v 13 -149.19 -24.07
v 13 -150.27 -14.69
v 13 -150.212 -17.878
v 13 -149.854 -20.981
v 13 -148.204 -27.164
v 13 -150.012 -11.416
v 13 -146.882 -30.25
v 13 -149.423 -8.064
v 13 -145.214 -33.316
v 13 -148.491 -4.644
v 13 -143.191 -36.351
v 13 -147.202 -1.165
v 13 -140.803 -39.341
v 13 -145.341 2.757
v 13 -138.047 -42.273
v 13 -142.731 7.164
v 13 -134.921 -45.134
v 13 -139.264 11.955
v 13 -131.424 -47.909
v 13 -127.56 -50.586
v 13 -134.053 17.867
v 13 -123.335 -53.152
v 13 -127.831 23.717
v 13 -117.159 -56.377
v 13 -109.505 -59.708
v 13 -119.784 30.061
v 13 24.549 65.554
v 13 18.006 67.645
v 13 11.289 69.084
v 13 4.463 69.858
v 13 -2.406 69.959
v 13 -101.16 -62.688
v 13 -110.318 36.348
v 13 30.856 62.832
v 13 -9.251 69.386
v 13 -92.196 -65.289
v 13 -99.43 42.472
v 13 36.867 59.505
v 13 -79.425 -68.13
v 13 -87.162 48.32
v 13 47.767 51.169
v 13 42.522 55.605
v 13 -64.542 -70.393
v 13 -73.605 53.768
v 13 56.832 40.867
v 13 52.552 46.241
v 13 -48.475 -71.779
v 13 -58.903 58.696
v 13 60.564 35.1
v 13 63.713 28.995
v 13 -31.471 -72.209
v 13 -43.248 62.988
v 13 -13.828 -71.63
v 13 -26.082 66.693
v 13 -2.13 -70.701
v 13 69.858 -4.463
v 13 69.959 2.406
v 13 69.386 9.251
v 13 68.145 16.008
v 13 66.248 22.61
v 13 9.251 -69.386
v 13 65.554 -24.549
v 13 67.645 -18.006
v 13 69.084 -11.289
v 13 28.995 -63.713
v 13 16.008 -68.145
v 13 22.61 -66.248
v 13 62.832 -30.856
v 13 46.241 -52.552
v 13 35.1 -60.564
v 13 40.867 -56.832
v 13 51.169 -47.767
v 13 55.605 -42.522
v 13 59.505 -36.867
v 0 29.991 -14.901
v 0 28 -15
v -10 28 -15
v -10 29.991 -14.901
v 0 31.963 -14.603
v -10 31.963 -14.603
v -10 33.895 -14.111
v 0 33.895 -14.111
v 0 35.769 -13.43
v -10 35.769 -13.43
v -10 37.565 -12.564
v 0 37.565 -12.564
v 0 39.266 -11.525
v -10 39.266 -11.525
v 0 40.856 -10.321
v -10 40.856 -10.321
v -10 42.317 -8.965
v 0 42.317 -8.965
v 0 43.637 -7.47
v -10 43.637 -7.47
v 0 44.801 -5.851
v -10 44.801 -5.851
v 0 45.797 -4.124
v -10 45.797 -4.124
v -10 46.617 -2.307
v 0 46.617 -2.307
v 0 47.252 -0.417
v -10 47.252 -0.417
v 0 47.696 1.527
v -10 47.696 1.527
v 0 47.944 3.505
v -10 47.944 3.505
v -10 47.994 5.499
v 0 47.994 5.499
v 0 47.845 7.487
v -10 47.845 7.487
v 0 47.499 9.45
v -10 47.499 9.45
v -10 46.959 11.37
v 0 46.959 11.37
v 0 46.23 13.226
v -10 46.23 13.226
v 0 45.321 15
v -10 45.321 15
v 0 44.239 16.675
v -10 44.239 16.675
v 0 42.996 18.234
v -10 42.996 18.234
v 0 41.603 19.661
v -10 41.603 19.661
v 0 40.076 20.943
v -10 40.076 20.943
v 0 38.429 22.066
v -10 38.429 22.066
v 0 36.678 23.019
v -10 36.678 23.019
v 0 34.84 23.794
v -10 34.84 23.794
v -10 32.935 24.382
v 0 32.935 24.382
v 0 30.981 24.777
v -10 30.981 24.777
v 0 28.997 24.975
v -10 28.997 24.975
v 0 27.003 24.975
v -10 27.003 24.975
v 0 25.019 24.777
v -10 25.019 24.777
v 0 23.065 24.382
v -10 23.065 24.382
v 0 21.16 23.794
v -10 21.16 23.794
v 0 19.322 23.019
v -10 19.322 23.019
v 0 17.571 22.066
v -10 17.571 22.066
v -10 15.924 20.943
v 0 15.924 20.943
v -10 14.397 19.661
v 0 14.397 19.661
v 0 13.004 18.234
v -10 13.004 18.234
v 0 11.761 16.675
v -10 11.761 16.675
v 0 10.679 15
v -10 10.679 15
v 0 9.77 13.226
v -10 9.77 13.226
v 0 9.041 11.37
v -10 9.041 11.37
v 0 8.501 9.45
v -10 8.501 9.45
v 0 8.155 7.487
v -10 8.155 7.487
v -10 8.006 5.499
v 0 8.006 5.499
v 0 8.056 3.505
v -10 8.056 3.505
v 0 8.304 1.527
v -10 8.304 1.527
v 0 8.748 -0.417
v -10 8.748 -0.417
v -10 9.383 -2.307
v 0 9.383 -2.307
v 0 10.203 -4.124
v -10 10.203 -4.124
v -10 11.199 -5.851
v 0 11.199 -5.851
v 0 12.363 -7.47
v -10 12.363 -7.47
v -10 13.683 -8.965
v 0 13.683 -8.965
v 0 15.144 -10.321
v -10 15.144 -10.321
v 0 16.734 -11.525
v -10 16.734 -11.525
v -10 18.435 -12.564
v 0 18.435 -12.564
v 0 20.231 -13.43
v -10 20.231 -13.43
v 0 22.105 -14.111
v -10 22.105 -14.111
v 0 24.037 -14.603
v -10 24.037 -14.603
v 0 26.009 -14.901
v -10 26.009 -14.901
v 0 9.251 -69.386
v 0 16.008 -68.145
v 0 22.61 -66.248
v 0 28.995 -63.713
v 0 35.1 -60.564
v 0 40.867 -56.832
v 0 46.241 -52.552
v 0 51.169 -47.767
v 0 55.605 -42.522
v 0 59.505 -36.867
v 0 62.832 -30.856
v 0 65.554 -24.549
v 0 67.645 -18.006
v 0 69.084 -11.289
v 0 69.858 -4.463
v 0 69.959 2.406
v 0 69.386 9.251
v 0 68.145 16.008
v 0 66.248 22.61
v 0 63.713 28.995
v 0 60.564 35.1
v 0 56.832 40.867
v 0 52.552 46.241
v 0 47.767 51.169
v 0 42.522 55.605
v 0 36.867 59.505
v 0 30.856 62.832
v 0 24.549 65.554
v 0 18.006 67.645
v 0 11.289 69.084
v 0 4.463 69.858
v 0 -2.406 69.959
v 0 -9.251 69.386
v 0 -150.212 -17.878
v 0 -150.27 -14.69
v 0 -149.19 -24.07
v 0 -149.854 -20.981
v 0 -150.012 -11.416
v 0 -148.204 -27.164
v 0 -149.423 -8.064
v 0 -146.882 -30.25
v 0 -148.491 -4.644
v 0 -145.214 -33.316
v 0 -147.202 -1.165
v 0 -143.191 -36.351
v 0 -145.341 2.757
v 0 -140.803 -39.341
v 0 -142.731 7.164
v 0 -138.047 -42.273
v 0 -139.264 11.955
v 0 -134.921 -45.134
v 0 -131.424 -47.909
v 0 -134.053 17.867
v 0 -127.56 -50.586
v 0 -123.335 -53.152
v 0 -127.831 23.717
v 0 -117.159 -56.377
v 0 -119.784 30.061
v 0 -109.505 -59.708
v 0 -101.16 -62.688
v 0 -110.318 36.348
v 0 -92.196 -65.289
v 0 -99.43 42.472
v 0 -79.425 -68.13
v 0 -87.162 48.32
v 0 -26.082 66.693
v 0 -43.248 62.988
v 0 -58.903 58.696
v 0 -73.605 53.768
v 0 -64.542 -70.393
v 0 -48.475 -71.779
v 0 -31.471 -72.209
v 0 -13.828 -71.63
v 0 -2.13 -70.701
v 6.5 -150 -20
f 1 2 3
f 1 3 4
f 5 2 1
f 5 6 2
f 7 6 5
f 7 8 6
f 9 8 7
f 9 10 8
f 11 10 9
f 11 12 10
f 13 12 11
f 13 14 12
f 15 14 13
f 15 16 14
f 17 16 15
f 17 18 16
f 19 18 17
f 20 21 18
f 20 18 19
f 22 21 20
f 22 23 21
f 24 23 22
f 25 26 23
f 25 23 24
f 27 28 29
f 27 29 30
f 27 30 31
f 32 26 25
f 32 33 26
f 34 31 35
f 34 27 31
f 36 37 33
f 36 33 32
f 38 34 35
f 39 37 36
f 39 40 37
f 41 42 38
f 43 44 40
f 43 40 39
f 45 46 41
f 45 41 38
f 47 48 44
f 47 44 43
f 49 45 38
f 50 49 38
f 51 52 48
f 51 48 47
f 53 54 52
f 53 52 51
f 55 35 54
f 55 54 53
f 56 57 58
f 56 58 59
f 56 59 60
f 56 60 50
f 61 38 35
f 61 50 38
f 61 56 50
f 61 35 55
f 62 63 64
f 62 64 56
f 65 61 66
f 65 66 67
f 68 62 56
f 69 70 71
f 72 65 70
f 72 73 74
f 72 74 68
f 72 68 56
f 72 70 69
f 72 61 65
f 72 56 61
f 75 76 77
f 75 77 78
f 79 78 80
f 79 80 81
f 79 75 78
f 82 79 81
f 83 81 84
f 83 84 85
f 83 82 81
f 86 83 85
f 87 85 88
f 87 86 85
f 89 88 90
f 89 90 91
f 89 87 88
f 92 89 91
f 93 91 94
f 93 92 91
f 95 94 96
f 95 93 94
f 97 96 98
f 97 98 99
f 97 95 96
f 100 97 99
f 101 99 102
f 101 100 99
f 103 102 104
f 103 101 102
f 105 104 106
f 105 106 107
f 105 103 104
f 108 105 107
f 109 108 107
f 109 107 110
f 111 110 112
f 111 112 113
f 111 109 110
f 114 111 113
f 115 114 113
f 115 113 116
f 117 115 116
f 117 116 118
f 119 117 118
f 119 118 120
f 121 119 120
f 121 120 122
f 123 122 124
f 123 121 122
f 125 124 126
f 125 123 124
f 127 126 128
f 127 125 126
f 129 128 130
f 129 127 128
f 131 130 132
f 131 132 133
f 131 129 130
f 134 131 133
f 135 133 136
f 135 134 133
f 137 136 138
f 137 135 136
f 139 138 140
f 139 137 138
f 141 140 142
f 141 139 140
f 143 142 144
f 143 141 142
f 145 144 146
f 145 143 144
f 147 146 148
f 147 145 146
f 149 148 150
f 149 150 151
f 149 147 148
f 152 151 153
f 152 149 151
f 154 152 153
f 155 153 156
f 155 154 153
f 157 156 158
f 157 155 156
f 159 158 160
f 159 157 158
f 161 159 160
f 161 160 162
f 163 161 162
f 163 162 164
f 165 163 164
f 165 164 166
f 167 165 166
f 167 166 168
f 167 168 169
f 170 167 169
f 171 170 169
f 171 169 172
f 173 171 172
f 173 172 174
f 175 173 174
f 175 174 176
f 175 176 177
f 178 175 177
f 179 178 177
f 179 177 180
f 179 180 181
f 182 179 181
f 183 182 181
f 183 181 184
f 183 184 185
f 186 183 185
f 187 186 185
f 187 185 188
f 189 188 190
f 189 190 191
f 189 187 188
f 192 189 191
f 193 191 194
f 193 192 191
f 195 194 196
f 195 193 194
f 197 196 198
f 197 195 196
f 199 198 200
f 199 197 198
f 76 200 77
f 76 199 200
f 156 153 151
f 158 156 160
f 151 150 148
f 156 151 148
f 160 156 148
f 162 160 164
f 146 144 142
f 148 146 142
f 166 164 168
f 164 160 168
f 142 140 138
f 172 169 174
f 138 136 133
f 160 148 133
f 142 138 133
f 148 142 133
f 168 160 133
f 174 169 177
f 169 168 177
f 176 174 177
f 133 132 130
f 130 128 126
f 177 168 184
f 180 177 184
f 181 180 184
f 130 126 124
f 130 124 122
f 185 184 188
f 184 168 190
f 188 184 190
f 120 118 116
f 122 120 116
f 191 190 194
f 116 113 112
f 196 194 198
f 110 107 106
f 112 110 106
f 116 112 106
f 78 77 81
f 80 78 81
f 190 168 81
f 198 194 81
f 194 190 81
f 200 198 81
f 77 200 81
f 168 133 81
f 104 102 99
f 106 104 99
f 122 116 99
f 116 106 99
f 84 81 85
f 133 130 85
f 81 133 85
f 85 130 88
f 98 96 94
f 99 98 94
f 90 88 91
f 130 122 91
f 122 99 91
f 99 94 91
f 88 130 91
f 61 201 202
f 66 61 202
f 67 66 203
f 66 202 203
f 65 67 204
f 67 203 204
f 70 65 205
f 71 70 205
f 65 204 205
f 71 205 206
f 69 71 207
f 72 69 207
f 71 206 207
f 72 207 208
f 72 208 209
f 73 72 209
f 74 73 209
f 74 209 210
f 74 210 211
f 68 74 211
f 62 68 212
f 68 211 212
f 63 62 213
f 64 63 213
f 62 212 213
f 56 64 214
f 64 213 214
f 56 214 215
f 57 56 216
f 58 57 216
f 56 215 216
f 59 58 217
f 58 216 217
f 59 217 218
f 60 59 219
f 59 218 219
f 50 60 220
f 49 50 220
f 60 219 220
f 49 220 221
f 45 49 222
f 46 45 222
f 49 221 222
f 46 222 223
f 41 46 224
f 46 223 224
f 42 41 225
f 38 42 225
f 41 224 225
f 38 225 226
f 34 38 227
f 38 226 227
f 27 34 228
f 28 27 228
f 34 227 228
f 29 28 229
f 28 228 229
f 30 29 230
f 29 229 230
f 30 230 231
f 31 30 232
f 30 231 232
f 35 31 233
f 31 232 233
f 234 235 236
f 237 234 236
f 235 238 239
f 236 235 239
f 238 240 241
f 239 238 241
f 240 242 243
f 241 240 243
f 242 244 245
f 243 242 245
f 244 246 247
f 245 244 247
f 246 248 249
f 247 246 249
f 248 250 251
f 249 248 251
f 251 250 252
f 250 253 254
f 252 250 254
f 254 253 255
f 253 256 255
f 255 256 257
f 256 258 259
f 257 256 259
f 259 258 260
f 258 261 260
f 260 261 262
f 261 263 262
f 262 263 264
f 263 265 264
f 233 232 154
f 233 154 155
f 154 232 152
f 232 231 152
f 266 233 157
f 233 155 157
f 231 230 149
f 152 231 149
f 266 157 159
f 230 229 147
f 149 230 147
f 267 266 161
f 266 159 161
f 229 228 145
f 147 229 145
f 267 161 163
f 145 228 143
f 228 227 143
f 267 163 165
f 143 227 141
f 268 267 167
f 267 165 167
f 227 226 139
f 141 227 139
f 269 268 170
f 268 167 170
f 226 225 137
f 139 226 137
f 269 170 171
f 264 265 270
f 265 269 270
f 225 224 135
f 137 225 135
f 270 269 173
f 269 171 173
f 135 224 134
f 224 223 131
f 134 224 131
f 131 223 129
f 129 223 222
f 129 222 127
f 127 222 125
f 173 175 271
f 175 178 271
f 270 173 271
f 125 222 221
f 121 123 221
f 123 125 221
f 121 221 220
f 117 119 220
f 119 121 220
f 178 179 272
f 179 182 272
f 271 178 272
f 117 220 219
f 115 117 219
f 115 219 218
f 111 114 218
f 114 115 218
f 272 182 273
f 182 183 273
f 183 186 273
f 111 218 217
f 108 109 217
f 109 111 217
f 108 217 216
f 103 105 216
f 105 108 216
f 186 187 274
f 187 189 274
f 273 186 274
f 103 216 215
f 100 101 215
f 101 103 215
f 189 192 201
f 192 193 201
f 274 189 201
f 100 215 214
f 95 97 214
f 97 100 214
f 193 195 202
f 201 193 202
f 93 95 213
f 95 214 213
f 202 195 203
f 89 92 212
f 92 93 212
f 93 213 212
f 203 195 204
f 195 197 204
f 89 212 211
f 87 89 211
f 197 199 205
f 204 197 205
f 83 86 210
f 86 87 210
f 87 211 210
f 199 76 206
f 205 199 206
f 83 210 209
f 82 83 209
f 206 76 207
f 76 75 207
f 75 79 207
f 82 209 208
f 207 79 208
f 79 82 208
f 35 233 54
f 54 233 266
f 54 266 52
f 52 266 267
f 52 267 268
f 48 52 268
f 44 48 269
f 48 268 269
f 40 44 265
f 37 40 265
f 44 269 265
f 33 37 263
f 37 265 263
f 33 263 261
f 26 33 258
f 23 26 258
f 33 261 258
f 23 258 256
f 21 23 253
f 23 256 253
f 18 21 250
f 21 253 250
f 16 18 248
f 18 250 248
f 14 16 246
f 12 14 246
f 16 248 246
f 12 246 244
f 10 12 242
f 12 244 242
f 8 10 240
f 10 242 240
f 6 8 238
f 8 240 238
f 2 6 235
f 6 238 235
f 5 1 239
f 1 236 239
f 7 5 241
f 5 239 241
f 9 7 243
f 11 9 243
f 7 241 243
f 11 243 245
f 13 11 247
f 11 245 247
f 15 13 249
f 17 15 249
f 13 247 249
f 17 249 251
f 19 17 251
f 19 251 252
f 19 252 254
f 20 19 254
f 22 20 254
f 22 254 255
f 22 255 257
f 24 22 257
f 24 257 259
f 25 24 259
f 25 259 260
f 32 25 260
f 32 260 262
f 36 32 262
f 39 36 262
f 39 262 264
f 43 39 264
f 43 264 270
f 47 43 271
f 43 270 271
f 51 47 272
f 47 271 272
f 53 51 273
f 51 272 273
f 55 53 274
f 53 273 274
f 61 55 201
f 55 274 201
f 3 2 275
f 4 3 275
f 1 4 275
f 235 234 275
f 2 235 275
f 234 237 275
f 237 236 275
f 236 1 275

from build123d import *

# Parameters (mm, degrees)
RESSALTO_EXTRUS_O11_DEPTH = 13
ESBO_O44_R                = 20
RESSALTO_EXTRUS_O12_DEPTH = 10


with BuildPart() as part:
    # Esboço43 → Ressalto-extrusão11 (new body)
    with BuildSketch(Plane(origin=(0, 0, 0), x_dir=(0, 0, -1), z_dir=(1, 0, 0))):
        with BuildLine():
            ThreePointArc((69.385953048, 9.251460406), (-9.251460406, 69.385953048), (-69.385953048, -9.251460406))
            add(Edge.make_bspline(
                [(-69.385953048, -9.251460406), (-49.385953048, -159.251460406), (20, -150), (89.385953048, -140.748539594), (69.385953048, 9.251460406)],
                knots=[4.71238898, 4.71238898, 4.71238898, 6.283185307, 6.283185307, 7.853981634, 7.853981634, 7.853981634], degree=2, weights=[1, 0.707106781, 1, 0.707106781, 1]))
        make_face()
    extrude(amount=RESSALTO_EXTRUS_O11_DEPTH)

    # Esboço44 → Ressalto-extrusão12 (add)
    with BuildSketch(Plane(origin=(0, 0, 0), x_dir=(0, 0, -1), z_dir=(1, 0, 0))):
        with Locations((-5, 28.000002978)):
            Circle(ESBO_O44_R)
    extrude(amount=-RESSALTO_EXTRUS_O12_DEPTH)


solid = part.part
